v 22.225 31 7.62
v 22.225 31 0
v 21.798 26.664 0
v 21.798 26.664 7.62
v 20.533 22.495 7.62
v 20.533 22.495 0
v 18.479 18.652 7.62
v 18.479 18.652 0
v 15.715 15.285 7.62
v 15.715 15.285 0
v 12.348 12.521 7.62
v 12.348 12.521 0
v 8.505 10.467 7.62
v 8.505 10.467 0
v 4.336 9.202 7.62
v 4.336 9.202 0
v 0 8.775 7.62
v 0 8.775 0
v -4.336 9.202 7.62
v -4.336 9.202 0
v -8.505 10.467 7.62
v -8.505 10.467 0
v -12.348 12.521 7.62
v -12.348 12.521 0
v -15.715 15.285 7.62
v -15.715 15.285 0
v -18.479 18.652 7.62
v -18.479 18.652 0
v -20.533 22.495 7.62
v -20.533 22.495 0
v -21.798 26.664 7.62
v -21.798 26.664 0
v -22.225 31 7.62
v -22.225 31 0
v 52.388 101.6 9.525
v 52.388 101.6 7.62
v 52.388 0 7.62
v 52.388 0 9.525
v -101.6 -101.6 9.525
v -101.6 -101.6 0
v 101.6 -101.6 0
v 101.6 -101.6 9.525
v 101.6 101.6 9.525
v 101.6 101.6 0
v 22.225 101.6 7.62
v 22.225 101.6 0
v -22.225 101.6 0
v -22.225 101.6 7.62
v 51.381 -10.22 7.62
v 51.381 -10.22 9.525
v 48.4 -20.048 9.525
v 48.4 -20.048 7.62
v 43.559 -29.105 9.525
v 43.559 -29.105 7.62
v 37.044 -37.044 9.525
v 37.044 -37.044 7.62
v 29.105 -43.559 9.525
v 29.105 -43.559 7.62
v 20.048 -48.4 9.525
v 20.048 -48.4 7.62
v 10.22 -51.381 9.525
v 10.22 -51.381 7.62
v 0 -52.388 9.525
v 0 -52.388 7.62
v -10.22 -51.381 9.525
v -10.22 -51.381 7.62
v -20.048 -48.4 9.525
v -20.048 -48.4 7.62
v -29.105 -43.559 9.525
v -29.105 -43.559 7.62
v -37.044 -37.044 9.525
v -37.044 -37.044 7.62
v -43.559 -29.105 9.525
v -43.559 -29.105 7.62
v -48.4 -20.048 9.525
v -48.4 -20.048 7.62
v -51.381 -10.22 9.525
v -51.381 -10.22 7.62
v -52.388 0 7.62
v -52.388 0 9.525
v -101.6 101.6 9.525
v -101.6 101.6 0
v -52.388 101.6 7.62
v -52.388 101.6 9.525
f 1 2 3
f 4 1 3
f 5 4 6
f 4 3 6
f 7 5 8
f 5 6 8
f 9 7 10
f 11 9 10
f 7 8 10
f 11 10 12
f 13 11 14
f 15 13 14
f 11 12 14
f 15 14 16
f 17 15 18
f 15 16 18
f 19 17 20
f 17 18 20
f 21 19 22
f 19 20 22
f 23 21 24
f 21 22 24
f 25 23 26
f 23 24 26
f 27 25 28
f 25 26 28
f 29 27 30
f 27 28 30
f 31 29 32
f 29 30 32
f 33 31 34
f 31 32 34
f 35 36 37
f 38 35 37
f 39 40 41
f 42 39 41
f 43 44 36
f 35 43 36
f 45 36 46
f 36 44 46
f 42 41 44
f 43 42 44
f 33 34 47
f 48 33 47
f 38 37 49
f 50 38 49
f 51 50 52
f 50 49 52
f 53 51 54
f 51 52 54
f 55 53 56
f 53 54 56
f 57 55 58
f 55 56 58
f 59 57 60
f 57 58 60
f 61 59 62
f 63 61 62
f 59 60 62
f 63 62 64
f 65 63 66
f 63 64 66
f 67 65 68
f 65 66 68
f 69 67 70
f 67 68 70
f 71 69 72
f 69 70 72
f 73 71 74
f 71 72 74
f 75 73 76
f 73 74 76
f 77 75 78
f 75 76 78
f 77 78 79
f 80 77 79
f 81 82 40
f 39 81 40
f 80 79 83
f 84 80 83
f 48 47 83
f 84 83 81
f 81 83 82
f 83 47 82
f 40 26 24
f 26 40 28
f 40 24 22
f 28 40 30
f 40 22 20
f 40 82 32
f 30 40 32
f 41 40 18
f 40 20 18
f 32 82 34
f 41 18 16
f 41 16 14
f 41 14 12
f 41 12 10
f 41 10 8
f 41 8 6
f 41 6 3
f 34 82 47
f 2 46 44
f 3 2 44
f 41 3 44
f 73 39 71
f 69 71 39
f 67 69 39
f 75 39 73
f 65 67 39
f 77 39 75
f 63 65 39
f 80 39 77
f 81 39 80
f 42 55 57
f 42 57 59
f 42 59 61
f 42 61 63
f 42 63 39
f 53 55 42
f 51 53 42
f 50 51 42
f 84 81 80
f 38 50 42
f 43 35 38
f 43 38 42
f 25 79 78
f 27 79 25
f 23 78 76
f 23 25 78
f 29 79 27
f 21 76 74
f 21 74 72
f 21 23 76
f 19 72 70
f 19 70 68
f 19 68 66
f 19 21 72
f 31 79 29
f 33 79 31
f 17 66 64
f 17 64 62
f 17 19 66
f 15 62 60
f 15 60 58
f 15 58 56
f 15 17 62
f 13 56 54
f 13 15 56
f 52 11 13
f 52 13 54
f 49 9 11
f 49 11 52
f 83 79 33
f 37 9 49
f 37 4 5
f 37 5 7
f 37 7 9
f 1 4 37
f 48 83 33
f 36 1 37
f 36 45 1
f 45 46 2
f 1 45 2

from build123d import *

# Parameters (mm, degrees)
F1_DEPTH = 9.525
F2_DEPTH = 7.62


# Not quite as in the source:
# - a feature names something its author has since deleted; it is built from what else it names


with BuildPart() as f1:
    # F0 (on Top) → F1 (new body)
    with BuildSketch(Plane.XY):
        with BuildLine():
            Line((-101.6, 101.6), (-101.6, -101.6))
            Line((-101.6, -101.6), (101.6, -101.6))
            Line((101.6, -101.6), (101.6, 101.6))
            Line((101.6, 101.6), (52.3875, 101.6))
            Line((52.3875, 101.6), (52.3875, 0))
            ThreePointArc((52.3875, 0), (0, -52.3875), (-52.3875, 0))
            Line((-52.3875, 0), (-52.3875, 101.6))
            Line((-52.3875, 101.6), (-101.6, 101.6))
        make_face()
    extrude(amount=F1_DEPTH)

    # F0 (on Top) → F2 (join)
    with BuildSketch(Plane.XY):
        with BuildLine():
            Line((-22.225, 101.6), (-52.3875, 101.6))
            Line((-52.3875, 101.6), (-52.3875, 0))
            ThreePointArc((-52.3875, 0), (-44.2083835022, 28.1081657953), (-22.225, 47.439430132))
            Line((-22.225, 47.439430132), (-22.225, 101.6))
        make_face()
        with BuildLine():
            Line((52.3875, 0), (52.3875, 101.6))
            Line((52.3875, 101.6), (22.225, 101.6))
            Line((22.225, 101.6), (22.225, 47.439430132))
            ThreePointArc((22.225, 47.439430132), (44.2083835022, 28.1081657953), (52.3875, 0))
        make_face()
        with BuildLine():
            ThreePointArc((-22.225, 47.439430132), (-44.2083835022, 28.1081657953), (-52.3875, 0))
            ThreePointArc((-52.3875, 0), (0, -52.3875), (52.3875, 0))
            ThreePointArc((52.3875, 0), (44.2083835022, 28.1081657953), (22.225, 47.439430132))
            Line((22.225, 47.439430132), (22.225, 31))
            ThreePointArc((22.225, 31), (0, 8.775), (-22.225, 31))
            Line((-22.225, 31), (-22.225, 47.439430132))
        make_face()
    extrude(amount=F2_DEPTH)


solid = f1.part
